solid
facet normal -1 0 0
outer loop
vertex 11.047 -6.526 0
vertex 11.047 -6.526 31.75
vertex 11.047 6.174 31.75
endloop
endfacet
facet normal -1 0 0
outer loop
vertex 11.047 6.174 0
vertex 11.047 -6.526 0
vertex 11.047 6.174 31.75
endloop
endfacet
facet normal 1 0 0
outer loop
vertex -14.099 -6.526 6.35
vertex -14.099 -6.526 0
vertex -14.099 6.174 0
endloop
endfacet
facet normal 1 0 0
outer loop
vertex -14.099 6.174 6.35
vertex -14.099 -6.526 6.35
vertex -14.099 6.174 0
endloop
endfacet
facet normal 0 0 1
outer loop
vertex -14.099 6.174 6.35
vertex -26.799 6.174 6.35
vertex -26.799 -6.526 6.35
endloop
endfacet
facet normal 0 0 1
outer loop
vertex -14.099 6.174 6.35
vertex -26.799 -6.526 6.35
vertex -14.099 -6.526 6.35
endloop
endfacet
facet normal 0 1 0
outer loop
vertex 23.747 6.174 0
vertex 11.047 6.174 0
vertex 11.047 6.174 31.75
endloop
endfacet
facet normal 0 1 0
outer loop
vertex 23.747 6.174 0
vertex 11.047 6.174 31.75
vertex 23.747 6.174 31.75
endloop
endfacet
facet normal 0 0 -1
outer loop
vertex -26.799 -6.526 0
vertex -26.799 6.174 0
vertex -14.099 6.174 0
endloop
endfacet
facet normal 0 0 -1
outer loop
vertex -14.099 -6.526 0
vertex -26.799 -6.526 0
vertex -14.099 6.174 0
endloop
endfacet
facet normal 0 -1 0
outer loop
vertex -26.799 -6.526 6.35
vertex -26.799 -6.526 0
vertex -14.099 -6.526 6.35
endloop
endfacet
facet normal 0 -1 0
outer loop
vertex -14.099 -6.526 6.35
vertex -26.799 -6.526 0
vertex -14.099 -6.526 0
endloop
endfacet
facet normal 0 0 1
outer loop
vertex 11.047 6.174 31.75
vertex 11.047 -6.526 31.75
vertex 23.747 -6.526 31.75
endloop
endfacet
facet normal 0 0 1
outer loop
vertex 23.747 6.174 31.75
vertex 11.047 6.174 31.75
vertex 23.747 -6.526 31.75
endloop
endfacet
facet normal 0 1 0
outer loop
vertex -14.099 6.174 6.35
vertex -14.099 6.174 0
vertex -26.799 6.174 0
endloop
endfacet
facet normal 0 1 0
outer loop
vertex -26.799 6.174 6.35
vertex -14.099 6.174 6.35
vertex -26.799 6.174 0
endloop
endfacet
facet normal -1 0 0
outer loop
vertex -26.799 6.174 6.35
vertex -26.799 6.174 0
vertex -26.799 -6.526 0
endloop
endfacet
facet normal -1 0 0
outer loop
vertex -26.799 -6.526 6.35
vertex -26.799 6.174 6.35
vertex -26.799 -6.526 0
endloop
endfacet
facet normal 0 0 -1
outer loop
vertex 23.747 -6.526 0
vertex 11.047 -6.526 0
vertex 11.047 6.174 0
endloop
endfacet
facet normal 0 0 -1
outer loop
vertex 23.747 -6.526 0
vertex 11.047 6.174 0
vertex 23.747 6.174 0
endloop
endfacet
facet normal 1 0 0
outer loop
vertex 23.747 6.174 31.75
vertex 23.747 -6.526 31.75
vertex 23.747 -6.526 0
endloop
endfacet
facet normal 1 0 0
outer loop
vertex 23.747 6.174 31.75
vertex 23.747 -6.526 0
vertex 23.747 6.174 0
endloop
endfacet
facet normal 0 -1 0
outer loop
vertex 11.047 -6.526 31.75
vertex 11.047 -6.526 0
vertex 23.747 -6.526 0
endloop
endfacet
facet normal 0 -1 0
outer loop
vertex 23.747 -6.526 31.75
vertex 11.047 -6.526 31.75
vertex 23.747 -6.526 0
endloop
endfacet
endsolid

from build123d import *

# Parameters (mm, degrees)
F1_DEPTH = 6.35
F0_W     = 12.7
F0_H     = 12.7
F2_DEPTH = 31.75


# Not quite as in the source:
# - ends of sketch curves that miss each other by under 0.0002 mm in the source are joined


with BuildPart() as f1:
    # F0 (on Top) → F1 (new body)
    with BuildSketch(Plane.XY):
        Polygon((-14.0986793399, 6.1743884951), (-26.7986793399, 6.1743884951), (-26.7986777842, -6.5256115049), (-14.0986793399, -6.5256115049), align=None)
    extrude(amount=F1_DEPTH)


with BuildPart() as f2:
    # F0 (on Top) → F2 (new body)
    with BuildSketch(Plane.XY):
        with Locations((17.397325097, -0.1756115049)):
            Rectangle(F0_W, F0_H)
    extrude(amount=F2_DEPTH)


solid = Compound([f1.part, f2.part])
